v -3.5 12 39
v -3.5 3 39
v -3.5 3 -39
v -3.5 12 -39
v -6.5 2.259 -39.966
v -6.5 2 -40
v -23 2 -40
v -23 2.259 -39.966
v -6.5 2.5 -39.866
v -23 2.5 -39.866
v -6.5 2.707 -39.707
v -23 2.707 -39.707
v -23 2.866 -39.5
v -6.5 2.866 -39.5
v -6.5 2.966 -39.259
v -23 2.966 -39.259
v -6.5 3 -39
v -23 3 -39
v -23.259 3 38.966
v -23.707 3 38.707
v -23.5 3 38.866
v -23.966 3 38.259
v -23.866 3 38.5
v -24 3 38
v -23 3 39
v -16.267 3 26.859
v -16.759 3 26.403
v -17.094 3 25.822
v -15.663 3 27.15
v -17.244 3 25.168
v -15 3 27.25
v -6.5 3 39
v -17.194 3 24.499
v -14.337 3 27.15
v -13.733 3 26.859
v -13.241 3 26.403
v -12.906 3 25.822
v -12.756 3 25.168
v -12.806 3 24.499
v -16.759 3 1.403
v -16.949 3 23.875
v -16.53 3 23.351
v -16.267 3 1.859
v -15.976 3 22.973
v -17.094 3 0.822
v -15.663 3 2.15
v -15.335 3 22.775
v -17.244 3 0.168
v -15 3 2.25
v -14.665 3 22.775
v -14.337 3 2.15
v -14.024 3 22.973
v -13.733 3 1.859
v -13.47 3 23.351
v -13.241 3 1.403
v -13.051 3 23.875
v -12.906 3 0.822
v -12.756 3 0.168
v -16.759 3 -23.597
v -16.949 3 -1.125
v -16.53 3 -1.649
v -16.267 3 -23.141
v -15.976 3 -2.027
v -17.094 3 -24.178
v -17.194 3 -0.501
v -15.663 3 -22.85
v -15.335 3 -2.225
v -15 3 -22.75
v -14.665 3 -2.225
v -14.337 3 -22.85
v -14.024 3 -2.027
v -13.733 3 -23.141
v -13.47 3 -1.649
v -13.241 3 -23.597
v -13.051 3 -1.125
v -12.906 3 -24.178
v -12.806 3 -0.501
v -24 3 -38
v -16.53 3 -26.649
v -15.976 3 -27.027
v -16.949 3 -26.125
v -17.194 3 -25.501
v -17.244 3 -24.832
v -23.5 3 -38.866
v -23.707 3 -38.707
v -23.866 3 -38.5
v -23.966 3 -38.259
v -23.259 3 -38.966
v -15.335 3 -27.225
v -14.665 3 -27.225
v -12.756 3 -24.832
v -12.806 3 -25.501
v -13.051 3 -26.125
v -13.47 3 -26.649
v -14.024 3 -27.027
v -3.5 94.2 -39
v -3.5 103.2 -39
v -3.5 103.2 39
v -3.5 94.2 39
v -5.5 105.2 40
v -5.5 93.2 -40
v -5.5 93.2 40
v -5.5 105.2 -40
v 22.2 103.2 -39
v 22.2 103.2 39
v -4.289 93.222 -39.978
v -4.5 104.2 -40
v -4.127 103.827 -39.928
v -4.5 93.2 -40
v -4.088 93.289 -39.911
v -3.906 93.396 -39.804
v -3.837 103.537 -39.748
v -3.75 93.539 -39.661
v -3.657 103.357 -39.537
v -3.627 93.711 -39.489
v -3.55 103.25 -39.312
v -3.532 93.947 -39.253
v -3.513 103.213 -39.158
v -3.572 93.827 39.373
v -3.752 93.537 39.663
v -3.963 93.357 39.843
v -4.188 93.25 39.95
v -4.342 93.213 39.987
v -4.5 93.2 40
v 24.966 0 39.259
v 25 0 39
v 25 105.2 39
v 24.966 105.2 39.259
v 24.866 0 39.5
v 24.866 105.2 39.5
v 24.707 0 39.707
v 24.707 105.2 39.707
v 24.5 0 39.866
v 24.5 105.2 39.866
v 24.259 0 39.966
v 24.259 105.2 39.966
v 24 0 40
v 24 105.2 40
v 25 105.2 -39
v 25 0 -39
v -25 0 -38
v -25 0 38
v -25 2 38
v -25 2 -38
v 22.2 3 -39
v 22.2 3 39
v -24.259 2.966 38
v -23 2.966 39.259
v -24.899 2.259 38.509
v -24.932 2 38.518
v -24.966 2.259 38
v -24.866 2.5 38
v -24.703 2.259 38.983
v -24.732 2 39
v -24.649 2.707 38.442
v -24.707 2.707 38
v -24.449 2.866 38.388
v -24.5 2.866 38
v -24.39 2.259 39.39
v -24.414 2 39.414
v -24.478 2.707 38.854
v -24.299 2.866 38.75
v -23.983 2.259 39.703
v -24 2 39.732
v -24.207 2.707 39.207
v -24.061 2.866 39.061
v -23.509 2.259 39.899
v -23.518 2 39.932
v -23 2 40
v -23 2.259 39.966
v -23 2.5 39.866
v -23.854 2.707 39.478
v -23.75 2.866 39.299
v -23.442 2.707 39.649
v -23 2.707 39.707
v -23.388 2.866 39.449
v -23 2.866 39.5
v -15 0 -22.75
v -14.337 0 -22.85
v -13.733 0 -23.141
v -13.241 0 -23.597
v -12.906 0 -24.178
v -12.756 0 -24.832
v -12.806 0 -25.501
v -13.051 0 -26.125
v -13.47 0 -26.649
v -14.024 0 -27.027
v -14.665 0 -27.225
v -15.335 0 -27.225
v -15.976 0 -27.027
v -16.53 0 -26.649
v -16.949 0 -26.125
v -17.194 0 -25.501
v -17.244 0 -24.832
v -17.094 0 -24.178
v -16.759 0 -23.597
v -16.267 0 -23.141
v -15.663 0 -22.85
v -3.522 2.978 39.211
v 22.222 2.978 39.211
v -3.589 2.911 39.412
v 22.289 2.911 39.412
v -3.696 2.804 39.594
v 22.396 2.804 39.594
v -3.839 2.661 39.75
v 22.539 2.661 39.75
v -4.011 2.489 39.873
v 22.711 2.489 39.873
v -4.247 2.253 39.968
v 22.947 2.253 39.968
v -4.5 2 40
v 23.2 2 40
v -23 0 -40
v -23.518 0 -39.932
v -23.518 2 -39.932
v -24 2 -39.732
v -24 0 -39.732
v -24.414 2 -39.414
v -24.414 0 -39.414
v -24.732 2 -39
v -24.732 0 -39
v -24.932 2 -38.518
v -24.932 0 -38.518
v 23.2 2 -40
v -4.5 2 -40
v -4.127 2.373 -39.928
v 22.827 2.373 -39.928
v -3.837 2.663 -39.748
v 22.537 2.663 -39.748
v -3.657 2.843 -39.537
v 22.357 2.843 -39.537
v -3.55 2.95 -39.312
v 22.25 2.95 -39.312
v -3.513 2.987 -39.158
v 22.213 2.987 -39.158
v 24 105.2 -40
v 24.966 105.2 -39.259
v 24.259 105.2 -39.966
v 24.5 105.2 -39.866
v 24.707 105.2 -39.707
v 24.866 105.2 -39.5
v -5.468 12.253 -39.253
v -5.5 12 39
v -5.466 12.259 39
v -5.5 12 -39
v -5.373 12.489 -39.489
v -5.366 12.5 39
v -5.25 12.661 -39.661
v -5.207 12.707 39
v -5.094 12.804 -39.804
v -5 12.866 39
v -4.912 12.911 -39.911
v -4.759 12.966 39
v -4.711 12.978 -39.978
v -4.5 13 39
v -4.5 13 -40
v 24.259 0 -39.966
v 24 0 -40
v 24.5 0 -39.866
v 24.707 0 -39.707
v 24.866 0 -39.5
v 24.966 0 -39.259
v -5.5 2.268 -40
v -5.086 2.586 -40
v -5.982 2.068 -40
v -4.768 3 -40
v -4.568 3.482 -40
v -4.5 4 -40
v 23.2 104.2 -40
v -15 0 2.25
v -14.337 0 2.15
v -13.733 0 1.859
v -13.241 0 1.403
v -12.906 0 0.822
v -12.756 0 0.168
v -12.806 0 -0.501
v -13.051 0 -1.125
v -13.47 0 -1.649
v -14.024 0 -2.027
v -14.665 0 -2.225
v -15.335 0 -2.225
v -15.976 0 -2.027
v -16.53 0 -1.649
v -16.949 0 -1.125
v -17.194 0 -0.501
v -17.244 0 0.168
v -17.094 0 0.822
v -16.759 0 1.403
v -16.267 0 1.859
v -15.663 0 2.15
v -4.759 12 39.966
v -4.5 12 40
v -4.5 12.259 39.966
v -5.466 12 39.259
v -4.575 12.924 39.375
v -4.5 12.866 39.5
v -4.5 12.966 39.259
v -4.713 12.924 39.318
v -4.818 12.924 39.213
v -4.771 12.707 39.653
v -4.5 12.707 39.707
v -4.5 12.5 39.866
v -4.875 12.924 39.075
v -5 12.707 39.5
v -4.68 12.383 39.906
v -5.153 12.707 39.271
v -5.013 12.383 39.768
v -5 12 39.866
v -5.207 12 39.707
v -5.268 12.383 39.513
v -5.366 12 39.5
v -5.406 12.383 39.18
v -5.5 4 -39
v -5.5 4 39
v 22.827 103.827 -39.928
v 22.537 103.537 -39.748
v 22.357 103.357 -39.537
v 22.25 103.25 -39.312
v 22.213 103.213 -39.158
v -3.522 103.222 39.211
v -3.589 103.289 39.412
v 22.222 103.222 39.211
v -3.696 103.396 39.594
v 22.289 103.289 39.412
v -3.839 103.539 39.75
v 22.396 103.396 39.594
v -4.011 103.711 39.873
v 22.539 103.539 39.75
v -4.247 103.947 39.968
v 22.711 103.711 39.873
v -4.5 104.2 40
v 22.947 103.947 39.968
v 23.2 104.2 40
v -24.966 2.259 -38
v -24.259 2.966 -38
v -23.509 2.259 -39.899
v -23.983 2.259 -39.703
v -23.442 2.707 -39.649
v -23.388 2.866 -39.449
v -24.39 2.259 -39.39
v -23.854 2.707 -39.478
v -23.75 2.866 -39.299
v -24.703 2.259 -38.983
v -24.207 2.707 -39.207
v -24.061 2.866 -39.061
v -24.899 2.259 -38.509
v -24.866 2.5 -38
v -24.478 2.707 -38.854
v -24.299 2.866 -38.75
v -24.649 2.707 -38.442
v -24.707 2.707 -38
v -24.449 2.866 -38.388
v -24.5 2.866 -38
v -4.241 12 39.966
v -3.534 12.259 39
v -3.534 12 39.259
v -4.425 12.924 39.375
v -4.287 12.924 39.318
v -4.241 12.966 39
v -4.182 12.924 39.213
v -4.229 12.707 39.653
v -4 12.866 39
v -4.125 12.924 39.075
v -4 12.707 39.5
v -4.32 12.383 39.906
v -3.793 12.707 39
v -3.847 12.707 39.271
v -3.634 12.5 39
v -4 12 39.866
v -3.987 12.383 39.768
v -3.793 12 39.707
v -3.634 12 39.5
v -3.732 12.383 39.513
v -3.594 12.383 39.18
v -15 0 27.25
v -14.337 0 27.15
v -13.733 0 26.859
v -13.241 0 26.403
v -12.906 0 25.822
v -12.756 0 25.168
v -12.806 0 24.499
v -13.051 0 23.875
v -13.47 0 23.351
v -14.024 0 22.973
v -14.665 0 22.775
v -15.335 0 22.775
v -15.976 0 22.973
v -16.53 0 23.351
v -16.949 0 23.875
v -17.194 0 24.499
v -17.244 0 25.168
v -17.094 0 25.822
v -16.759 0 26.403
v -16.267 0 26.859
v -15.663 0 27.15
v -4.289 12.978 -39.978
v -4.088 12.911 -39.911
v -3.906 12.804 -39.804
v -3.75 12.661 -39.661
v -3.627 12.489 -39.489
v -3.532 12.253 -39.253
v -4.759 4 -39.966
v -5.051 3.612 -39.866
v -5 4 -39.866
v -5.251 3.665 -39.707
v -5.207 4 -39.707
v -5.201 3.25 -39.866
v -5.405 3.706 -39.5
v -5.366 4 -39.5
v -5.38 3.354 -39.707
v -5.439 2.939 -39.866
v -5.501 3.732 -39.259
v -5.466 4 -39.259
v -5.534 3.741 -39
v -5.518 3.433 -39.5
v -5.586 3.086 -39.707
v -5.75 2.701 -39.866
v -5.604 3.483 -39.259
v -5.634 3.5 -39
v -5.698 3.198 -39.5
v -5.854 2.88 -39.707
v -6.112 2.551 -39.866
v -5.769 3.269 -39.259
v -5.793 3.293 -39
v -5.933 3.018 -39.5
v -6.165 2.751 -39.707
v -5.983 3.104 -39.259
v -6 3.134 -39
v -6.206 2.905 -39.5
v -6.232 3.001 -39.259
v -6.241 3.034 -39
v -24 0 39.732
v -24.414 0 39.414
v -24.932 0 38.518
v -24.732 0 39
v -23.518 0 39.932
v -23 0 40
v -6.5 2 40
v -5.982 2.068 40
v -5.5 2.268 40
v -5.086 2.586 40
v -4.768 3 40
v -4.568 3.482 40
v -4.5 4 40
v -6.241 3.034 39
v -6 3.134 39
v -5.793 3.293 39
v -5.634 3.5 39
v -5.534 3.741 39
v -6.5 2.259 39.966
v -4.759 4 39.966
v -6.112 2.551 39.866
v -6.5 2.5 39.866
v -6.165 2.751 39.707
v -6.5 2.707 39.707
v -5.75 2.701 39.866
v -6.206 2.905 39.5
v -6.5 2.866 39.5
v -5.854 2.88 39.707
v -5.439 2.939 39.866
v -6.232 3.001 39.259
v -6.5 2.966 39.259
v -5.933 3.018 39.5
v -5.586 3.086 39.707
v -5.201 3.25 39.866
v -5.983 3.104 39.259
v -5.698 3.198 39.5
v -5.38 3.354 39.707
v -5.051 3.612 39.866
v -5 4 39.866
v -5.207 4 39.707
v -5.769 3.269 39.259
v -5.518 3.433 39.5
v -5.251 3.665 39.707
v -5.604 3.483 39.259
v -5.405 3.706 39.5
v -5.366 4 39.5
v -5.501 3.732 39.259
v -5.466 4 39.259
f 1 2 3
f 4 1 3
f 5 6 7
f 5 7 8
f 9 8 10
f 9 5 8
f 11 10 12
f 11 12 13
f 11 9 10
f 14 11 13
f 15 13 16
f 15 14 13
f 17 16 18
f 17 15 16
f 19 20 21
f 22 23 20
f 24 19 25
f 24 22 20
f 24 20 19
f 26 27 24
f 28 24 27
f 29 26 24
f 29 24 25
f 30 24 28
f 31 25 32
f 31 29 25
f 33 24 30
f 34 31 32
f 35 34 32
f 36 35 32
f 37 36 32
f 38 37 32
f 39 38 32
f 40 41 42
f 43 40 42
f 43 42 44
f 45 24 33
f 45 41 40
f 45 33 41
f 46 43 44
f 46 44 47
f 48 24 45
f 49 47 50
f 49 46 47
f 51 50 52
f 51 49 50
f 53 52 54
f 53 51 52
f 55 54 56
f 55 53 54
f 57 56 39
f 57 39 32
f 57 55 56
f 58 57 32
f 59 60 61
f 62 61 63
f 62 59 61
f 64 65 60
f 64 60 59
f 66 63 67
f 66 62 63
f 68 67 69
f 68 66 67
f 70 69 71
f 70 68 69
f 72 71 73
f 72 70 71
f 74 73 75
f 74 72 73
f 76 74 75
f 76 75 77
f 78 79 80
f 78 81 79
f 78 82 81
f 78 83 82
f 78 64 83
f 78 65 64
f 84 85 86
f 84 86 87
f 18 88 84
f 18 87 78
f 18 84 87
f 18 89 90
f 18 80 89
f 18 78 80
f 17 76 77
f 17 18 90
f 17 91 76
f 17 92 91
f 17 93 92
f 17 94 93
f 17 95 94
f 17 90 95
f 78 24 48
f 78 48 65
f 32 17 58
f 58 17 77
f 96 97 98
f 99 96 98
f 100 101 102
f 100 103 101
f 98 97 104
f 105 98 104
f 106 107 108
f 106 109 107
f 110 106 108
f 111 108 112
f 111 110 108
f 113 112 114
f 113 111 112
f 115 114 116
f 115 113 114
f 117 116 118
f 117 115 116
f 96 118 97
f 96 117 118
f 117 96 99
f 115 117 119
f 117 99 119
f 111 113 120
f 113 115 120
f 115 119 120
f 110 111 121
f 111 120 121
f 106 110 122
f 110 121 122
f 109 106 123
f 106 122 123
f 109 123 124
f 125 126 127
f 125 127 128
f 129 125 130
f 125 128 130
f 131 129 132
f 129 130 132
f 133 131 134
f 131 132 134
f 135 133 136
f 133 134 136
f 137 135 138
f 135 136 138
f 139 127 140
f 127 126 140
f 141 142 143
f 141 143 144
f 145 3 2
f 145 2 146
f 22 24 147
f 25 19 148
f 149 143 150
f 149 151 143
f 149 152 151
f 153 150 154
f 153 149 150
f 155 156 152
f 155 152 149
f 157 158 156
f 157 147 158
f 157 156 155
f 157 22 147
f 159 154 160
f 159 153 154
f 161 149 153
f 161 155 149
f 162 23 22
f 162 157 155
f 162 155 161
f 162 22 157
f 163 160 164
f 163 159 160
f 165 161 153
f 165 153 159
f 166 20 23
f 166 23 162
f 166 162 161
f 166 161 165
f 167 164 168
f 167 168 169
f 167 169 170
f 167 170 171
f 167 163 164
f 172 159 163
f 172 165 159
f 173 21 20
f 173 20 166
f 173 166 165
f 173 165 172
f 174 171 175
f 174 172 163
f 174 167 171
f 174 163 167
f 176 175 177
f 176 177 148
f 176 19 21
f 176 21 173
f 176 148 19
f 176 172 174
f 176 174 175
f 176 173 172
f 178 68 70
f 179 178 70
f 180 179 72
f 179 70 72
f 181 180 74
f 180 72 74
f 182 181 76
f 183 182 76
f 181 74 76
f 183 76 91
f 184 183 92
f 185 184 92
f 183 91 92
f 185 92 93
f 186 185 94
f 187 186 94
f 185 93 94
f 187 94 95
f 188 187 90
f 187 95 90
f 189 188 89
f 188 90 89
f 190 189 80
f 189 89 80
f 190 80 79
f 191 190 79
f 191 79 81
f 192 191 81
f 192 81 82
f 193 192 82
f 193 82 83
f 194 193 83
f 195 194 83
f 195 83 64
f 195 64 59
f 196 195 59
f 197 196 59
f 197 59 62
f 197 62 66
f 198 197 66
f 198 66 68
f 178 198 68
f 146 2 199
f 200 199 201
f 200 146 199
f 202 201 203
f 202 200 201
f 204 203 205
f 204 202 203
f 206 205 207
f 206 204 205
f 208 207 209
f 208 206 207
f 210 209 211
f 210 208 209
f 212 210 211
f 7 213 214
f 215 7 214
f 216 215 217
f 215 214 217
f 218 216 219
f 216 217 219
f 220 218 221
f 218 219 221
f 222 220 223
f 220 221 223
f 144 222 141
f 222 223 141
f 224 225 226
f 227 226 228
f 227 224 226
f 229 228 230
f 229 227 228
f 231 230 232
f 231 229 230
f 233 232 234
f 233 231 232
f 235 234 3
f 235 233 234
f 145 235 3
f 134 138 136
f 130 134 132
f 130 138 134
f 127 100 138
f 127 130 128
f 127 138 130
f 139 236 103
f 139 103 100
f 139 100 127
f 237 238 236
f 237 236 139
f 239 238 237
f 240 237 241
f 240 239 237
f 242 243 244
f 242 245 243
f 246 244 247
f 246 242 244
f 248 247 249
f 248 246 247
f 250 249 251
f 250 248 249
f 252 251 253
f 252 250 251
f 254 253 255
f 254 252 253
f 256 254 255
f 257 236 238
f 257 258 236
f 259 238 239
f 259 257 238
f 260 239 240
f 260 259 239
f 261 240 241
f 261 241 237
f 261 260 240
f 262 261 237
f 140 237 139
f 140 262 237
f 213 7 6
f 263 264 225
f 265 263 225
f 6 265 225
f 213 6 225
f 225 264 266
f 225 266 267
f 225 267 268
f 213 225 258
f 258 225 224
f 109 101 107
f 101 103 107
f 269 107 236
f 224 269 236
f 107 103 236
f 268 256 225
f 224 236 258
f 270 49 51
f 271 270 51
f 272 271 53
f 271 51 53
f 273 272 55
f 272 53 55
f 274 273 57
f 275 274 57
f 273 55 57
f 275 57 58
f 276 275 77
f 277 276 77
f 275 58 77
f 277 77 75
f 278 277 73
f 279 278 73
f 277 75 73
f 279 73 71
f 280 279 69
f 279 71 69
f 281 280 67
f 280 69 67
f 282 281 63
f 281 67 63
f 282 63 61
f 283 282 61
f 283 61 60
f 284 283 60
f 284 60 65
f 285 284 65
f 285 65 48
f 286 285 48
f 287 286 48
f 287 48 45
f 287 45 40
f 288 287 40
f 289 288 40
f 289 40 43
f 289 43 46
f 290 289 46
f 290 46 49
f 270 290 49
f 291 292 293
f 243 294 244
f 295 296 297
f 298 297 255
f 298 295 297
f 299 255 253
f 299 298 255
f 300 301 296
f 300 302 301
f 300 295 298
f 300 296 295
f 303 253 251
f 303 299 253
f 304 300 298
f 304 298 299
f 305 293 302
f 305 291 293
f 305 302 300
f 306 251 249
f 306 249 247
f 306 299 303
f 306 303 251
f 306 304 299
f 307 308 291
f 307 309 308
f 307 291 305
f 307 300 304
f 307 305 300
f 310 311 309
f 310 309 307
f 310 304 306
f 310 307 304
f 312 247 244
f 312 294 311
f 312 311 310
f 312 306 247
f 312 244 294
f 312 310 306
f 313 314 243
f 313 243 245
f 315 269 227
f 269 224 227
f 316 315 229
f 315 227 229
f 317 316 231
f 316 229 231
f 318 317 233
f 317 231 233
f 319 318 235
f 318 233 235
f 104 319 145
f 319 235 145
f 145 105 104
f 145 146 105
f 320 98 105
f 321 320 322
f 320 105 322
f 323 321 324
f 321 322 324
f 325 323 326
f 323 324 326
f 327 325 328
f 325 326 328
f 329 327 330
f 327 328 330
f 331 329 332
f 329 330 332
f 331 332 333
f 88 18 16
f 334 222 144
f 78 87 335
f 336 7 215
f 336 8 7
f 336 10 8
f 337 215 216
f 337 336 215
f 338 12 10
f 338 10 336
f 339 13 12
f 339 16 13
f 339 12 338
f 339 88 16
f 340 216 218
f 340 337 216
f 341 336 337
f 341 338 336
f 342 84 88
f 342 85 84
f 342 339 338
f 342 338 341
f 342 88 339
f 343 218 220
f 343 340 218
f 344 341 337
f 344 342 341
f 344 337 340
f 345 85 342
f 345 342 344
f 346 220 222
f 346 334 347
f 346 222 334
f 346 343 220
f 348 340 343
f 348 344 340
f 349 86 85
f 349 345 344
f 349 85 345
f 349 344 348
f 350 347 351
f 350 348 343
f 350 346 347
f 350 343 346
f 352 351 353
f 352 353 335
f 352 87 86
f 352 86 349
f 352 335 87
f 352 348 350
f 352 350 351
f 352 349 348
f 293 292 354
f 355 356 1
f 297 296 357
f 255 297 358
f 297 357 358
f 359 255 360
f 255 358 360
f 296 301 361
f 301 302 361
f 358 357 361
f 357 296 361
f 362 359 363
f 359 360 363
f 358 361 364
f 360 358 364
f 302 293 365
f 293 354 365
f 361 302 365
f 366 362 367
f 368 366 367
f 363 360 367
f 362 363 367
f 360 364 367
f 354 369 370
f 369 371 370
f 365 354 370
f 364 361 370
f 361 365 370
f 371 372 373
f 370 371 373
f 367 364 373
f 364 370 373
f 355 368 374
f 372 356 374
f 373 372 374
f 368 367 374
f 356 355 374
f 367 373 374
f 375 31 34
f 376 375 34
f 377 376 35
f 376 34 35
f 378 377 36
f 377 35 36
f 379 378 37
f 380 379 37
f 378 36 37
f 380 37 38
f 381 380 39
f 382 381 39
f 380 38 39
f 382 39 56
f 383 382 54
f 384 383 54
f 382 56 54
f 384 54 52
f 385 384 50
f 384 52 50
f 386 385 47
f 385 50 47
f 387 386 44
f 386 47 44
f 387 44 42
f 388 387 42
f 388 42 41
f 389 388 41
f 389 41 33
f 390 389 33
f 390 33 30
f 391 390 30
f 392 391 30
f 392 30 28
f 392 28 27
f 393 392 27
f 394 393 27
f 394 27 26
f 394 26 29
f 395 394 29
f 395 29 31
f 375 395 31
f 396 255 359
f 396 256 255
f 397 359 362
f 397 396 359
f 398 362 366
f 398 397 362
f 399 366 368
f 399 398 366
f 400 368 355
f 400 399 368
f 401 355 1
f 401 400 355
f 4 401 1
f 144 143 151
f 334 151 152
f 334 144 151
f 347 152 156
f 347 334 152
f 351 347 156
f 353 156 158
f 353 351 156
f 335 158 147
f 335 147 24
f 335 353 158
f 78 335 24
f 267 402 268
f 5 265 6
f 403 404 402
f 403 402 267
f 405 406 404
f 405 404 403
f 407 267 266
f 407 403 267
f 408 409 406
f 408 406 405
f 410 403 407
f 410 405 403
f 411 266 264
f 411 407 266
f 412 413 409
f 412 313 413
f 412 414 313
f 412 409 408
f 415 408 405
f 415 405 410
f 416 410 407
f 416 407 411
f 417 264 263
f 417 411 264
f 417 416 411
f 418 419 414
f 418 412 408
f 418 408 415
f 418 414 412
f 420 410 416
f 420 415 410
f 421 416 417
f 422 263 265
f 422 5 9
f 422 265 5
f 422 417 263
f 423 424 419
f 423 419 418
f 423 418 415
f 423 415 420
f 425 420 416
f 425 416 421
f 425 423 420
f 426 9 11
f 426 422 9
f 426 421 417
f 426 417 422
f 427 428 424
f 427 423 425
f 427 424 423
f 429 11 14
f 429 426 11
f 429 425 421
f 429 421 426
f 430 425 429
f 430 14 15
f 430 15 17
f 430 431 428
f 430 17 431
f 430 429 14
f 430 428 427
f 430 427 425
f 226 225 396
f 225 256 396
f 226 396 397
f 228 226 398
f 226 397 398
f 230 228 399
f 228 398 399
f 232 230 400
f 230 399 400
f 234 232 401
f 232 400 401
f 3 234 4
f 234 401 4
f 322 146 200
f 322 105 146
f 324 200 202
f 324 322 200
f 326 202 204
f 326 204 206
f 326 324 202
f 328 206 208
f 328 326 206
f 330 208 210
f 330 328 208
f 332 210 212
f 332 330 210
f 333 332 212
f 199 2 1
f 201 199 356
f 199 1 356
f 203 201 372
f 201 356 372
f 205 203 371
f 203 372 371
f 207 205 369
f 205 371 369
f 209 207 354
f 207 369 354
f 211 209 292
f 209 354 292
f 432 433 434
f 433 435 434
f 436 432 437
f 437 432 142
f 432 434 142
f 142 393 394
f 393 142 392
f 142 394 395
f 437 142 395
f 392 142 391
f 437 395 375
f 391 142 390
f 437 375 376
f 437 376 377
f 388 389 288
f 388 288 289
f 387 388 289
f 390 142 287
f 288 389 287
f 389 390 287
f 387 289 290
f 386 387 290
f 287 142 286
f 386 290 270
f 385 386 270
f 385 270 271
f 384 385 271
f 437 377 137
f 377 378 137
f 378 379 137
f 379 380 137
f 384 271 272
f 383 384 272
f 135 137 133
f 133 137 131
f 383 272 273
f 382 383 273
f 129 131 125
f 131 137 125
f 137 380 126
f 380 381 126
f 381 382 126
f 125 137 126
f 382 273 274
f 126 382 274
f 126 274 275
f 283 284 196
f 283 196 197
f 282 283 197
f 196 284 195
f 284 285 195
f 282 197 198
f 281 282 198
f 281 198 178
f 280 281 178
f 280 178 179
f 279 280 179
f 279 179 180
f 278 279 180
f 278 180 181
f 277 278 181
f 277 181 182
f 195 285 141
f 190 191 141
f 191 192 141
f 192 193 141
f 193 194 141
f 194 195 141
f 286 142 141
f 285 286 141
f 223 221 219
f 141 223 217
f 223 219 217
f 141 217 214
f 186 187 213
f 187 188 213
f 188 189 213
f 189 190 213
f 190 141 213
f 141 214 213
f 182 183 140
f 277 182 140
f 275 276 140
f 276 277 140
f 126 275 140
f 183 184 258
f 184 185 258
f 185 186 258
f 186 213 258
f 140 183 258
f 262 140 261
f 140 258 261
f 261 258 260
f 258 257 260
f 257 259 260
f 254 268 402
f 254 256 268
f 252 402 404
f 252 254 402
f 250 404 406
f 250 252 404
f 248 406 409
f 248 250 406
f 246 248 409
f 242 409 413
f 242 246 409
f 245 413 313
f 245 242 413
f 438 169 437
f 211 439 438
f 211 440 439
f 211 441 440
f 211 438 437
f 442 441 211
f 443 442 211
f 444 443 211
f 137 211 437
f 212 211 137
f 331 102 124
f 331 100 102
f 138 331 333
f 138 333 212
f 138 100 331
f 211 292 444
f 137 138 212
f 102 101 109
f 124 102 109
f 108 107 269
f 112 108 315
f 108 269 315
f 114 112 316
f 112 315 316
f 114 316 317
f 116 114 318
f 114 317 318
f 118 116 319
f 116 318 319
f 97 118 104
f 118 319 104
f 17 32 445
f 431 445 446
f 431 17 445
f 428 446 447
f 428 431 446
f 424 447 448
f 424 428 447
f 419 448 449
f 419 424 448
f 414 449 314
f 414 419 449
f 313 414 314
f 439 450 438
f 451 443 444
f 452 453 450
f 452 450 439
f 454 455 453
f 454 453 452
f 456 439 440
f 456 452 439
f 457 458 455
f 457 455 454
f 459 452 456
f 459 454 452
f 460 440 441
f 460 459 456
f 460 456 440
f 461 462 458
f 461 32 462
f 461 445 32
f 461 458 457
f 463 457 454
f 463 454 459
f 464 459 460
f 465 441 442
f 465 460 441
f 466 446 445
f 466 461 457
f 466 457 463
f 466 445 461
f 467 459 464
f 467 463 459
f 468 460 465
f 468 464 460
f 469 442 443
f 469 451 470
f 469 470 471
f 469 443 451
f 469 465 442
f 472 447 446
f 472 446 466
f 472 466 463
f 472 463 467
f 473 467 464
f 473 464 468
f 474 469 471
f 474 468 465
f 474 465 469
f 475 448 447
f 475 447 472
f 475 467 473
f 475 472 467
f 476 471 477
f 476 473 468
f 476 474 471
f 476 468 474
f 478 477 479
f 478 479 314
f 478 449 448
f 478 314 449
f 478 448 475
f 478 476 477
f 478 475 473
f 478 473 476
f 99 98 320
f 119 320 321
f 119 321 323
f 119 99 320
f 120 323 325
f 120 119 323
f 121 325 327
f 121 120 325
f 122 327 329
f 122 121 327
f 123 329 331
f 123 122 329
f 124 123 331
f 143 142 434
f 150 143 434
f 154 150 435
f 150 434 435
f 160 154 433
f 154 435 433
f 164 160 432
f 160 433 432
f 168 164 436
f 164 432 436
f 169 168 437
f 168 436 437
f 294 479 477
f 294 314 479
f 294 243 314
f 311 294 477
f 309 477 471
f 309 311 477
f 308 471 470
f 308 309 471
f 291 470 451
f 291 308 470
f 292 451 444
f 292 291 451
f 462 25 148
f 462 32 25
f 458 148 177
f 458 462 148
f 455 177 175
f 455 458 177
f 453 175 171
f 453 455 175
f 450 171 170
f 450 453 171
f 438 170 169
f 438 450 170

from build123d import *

# Parameters (mm, degrees)
SKETCH1_W           = 50
SKETCH1_H           = 80
BOSS_EXTRUDE1_DEPTH = 3
SKETCH2_R           = 2.25
CUT_EXTRUDE1_DEPTH  = 48.265209192
SKETCH3_W           = 2.8
SKETCH3_H           = 80
SKETCH3_W_2         = 2
BOSS_EXTRUDE2_DEPTH = 10
SKETCH4_W           = 2.8
SKETCH4_H           = 80
BOSS_EXTRUDE3_DEPTH = 90.2
SKETCH5_W           = 30.5
SKETCH5_H           = 80
BOSS_EXTRUDE4_DEPTH = 2
SKETCH6_W           = 2
SKETCH6_H           = 80
BOSS_EXTRUDE5_DEPTH = 10
FILLET1_R           = 1
FILLET2_R           = 2


# Some blends are built 0.0001 mm under size
with BuildPart() as part:
    # Sketch1 → Boss-Extrude1 (new body)
    with BuildSketch(Plane(origin=(0, 0, 0), x_dir=(1, 0, 0), z_dir=(0, 1, 0))):
        Rectangle(SKETCH1_W, SKETCH1_H)
    extrude(amount=BOSS_EXTRUDE1_DEPTH)

    # Sketch2 → Cut-Extrude1 (cut, through all)
    with BuildSketch(Plane(origin=(0, 3, 0), x_dir=(1, 0, 0), z_dir=(0, 1, 0))):
        with Locations(Location((-15, 0, 0), (0, 0, 270))):
            Circle(SKETCH2_R)
        with Locations(Location((-15, 25, 0), (0, 0, 270))):
            Circle(SKETCH2_R)
        with Locations(Location((-15, -25, 0), (0, 0, 270))):
            Circle(SKETCH2_R)
    extrude(amount=-CUT_EXTRUDE1_DEPTH, mode=Mode.SUBTRACT)

    # Sketch3 → Boss-Extrude2 (add)
    with BuildSketch(Plane(origin=(0, 3, 0), x_dir=(1, 0, 0), z_dir=(0, 1, 0))):
        with Locations((23.6, 0)):
            Rectangle(SKETCH3_W, SKETCH3_H)
        with Locations((-4.5, 0)):
            Rectangle(SKETCH3_W_2, SKETCH3_H)
    extrude(amount=BOSS_EXTRUDE2_DEPTH)

    # Sketch4 → Boss-Extrude3 (add)
    with BuildSketch(Plane(origin=(0, 13, 0), x_dir=(1, 0, 0), z_dir=(0, 1, 0))):
        with Locations((23.6, 0)):
            Rectangle(SKETCH4_W, SKETCH4_H)
    extrude(amount=BOSS_EXTRUDE3_DEPTH)

    # Sketch5 → Boss-Extrude4 (add)
    with BuildSketch(Plane(origin=(0, 103.2, 0), x_dir=(1, 0, 0), z_dir=(0, 1, 0))):
        with Locations((9.75, 0)):
            Rectangle(SKETCH5_W, SKETCH5_H)
    extrude(amount=BOSS_EXTRUDE4_DEPTH)

    # Sketch6 → Boss-Extrude5 (add)
    with BuildSketch(Plane.XZ.offset(-103.2)):
        with Locations((-4.5, 0)):
            Rectangle(SKETCH6_W, SKETCH6_H)
    extrude(amount=BOSS_EXTRUDE5_DEPTH)

    # Fillet1
    fillet1_edges = [part.edges().sort_by_distance(p)[0] for p in [
        (-25, 3, 0),
        (-15.25, 3, 40),
        (9.35, 3, -40),
        (22.2, 53.1, 40),
        (22.2, 53.1, -40),
        (-15.25, 3, -40),
        (9.35, 3, 40),
        (-5.5, 8, 40),
        (-3.5, 8, 40),
        (-3.5, 8, -40),
        (-5.5, 3, 0),
        (-5.5, 8, -40),
        (-4.5, 13, 40),
        (-3.5, 13, 0),
        (-5.5, 13, 0),
        (9.35, 103.2, -40),
        (25, 52.6, 40),
        (25, 52.6, -40),
        (9.35, 103.2, 40),
        (-3.5, 98.2, -40),
        (-3.5, 98.2, 40),
        (-3.5, 93.2, 0),
    ]]
    fillet(fillet1_edges, radius=FILLET1_R - 0.0001)  # a hair under: the kernel refuses the full size

    # Fillet2
    # the kernel refuses this fillet: 2 mm, written as the material it takes off along each edge
    with BuildSketch(Plane(origin=(-23, 3, 38), x_dir=(-1, 0, 0), z_dir=(0, 0, -1))) as fillet2_piece_1:
        with BuildLine():
            CenterArc((1.0001, -0.9999), 0.9999, 0, 90)
            Line((2, -0.9999), (2, 0))
            Line((2, 0), (1.0001, 0))
        make_face()
    revolve(axis=Axis((-23, 3, 38), (0, 1, 0)), revolution_arc=90, mode=Mode.SUBTRACT)
    with BuildSketch(Plane(origin=(-23, 3, -38), x_dir=(0, 0, -1), z_dir=(1, 0, 0))) as fillet2_piece_2:
        with BuildLine():
            CenterArc((1.0001, -0.9999), 0.9999, 0, 90)
            Line((2, -0.9999), (2, 0))
            Line((2, 0), (1.0001, 0))
        make_face()
    revolve(axis=Axis((-23, 3, -38), (0, 1, 0)), revolution_arc=90, mode=Mode.SUBTRACT)
    with BuildSketch(Plane(origin=(-25, -5, 40), x_dir=(0, 0, -1), z_dir=(0, 1, 0)), Plane(origin=(-25, -5, -40), x_dir=(1, 0, 0), z_dir=(0, 1, 0))) as fillet2_piece_3:
        with BuildLine():
            CenterArc((FILLET2_R, -FILLET2_R), FILLET2_R, 90, 90)
            Line((0, -FILLET2_R), (0, 0))
            Line((0, 0), (FILLET2_R, 0))
        make_face()
    extrude(amount=8, mode=Mode.SUBTRACT)


solid = part.part
